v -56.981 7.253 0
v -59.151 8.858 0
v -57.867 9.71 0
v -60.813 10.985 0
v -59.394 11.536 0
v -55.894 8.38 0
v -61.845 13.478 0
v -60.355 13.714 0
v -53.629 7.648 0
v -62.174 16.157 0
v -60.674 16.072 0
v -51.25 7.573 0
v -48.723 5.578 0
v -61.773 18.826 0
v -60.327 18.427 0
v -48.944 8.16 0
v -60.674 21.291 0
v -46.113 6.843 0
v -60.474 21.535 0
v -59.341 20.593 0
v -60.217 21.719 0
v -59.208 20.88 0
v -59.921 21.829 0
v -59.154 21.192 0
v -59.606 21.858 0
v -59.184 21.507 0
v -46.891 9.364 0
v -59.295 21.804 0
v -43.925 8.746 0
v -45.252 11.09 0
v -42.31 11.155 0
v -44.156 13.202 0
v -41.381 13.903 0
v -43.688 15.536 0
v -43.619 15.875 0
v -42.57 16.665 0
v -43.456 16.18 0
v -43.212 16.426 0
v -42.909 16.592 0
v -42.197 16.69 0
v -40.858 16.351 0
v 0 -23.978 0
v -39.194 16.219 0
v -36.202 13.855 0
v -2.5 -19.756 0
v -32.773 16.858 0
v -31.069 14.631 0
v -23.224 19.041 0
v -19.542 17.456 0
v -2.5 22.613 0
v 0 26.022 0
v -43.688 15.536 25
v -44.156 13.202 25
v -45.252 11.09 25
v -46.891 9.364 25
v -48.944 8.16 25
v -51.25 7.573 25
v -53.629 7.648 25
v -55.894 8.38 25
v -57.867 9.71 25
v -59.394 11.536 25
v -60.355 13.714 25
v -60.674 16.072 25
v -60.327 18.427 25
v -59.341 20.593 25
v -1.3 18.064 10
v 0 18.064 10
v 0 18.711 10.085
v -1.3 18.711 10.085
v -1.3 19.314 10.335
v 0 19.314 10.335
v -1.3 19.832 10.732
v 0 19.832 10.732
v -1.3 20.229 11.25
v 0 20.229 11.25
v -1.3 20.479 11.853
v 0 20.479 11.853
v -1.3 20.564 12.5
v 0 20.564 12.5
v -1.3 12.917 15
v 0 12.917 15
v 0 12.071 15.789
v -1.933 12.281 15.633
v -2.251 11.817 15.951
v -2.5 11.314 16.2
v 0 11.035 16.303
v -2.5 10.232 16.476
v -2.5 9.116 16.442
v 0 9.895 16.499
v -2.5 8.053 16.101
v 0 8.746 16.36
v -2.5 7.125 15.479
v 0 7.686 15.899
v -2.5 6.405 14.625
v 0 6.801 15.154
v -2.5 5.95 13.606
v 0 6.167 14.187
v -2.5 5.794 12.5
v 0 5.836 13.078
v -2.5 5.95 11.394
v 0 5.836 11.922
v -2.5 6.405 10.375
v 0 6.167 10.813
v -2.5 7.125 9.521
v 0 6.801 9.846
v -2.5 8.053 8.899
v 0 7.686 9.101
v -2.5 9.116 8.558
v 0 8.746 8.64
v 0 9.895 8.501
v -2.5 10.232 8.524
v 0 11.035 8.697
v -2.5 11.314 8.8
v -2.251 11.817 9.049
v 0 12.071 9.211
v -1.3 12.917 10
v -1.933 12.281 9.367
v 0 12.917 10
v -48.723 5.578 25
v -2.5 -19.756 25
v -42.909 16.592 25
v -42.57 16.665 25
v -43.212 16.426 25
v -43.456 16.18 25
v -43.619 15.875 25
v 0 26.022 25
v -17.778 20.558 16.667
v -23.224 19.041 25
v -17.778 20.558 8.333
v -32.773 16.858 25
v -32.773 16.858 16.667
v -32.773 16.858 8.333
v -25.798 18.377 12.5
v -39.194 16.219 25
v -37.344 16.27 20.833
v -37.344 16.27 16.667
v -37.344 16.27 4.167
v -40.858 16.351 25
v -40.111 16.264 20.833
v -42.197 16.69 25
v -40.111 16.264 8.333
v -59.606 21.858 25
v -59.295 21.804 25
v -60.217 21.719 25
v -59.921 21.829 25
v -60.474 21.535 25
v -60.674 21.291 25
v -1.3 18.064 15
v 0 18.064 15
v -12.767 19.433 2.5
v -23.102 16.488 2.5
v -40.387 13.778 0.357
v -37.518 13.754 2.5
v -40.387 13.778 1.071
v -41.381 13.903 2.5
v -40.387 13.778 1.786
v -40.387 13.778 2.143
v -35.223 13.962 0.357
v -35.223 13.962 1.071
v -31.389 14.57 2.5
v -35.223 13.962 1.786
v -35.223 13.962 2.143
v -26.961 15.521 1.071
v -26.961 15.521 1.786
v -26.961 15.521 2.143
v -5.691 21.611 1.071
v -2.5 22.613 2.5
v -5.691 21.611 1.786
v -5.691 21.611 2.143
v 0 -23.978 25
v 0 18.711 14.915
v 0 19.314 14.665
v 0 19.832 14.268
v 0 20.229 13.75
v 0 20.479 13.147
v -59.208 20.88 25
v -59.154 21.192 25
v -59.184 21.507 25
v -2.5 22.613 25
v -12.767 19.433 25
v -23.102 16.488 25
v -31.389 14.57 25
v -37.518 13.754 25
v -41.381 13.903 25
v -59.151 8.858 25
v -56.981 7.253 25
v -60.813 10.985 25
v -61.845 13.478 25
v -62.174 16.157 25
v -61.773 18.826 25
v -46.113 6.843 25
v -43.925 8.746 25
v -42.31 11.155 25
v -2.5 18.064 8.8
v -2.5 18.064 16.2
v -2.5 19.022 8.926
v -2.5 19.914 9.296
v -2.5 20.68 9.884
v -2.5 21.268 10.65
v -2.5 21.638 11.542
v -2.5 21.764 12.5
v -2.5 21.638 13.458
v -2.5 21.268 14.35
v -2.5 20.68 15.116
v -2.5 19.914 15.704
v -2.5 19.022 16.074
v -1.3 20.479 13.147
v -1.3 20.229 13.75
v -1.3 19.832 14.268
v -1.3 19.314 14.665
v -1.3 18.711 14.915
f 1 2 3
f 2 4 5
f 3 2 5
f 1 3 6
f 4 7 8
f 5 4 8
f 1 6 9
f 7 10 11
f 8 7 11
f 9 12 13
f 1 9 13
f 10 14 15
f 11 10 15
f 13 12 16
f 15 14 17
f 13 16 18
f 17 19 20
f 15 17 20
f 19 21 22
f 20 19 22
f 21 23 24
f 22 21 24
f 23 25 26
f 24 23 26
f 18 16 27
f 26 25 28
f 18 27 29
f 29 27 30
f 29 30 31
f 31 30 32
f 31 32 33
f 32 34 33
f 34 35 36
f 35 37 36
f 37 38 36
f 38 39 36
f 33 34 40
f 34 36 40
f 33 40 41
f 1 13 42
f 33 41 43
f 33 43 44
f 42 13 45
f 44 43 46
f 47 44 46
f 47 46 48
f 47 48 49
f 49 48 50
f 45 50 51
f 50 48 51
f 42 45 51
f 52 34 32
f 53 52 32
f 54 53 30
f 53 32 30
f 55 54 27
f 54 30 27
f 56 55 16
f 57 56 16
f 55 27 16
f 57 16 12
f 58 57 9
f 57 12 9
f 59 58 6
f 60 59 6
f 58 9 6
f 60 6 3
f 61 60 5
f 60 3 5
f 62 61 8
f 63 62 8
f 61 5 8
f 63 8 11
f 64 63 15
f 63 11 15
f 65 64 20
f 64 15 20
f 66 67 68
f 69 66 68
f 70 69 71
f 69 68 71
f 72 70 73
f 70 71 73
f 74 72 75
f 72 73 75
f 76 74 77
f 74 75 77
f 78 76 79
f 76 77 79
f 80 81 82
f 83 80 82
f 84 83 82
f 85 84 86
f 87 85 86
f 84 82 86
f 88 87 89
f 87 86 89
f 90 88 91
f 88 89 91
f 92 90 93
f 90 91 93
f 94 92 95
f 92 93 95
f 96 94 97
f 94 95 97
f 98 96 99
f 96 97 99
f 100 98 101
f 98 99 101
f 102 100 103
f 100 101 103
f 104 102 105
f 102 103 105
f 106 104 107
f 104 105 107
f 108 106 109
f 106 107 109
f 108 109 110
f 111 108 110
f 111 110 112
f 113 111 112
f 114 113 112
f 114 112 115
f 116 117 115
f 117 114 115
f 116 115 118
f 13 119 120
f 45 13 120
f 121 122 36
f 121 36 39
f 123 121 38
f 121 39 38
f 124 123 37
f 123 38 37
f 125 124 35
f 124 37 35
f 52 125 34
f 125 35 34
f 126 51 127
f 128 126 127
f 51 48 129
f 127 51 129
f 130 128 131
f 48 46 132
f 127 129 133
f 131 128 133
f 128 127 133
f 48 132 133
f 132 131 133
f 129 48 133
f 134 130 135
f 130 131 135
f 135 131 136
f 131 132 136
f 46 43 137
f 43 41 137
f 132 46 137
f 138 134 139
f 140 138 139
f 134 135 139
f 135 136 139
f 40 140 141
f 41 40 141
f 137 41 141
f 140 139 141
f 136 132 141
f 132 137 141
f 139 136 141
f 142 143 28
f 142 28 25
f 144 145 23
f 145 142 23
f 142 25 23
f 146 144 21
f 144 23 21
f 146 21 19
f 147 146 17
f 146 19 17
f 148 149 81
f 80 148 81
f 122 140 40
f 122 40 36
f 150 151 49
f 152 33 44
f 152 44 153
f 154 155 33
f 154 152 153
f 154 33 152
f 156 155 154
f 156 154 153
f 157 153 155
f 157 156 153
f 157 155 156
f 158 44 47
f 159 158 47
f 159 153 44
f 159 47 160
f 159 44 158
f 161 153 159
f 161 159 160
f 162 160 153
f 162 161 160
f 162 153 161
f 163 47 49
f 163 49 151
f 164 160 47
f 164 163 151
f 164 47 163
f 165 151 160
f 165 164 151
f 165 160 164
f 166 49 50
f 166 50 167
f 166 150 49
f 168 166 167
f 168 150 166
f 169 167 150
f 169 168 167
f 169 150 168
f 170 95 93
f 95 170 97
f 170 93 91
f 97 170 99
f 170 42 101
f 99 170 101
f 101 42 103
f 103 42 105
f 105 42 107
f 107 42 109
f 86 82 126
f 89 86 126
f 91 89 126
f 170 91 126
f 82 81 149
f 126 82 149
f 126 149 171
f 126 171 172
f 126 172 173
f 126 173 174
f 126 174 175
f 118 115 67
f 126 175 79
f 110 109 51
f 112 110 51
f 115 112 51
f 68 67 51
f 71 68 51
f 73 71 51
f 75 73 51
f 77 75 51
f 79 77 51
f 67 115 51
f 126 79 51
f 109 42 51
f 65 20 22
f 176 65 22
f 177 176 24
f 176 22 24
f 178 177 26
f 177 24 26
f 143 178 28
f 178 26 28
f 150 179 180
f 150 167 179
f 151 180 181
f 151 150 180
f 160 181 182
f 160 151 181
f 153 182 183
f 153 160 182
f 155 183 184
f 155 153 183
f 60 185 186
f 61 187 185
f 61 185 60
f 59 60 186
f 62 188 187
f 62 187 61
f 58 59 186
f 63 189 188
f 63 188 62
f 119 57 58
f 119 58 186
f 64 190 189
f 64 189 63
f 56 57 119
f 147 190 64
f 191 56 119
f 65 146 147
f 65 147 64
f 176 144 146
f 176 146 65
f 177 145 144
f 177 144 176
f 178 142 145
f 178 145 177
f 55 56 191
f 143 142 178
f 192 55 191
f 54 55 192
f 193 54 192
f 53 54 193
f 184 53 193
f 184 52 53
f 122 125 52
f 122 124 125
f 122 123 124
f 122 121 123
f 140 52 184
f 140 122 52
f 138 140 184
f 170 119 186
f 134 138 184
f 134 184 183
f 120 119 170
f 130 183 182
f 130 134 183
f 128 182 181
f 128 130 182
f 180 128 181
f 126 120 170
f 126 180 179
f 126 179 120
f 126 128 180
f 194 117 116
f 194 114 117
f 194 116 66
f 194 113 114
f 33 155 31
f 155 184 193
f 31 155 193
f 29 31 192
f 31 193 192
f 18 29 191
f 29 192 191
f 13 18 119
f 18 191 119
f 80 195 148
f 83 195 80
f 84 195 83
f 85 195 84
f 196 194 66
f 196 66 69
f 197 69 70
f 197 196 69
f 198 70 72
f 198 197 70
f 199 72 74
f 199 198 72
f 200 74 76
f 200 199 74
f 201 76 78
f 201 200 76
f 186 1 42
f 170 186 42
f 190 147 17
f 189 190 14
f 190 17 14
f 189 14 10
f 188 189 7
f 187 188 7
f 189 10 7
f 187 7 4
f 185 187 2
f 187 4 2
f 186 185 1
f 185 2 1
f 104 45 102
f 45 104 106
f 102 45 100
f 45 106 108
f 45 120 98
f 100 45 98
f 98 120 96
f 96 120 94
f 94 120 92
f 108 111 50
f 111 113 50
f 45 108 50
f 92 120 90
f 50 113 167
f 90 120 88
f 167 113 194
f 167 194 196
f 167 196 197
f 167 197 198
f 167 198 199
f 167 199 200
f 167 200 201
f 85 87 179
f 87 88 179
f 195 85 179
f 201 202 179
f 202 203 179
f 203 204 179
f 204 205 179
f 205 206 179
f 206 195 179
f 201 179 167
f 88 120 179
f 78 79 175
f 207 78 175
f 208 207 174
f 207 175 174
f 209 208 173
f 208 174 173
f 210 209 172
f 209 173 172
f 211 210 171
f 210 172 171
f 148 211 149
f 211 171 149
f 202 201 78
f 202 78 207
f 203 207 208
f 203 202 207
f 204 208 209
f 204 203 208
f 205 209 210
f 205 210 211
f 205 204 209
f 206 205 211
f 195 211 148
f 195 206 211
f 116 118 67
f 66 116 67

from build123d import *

# Parameters (mm, degrees)
F1_DEPTH    = 25
F2_T1_DEPTH = 30.6274350033
F2_T3_DEPTH = 31.8341602247
F3_T        = -2.5
F4_DEPTH    = 25
F6_DEPTH    = 3
F7_SIZE     = 1.2


# Not quite as in the source:
# - a fillet or chamfer that OpenCascade refuses, or shapes differently, is made with other operations: its cross-section is extruded or revolved along the edge and cut away or added


with BuildPart() as f1:
    # F0 (on Top) → F1 (new body)
    with BuildSketch(Plane.XY):
        with BuildLine():
            Line((0, -23.9775525033), (0, 0))
            Line((0, 0), (0, 26.0224474967))
            add(Edge.make_bspline(
                [(0, 26.0224474967), (-18.2413181838, 20.2646104982), (-36.4872975651, 14.5034889639), (-42.1967271812, 16.6896569806)],
                knots=[0, 0, 0, 0, 0.7457520739, 0.7457520739, 0.7457520739, 0.7457520739], degree=3))
            ThreePointArc((-42.1967271812, 16.6896569806), (-46.7941768856, 7.5931695596), (-56.9807893445, 7.2532375123))
            Line((-56.9807893445, 7.2532375123), (0, -23.9775525033))
        make_face()
        with BuildLine():
            ThreePointArc((-56.9807893445, 7.2532375123), (-46.7941768856, 7.5931695596), (-42.1967271812, 16.6896569806))
            Line((-42.1967271812, 16.6896569806), (-43.6933846934, 16.589575558))
            ThreePointArc((-43.6933846934, 16.589575558), (-54.7874105132, 7.9340356852), (-58.7207947374, 21.4441899376))
            Line((-58.7207947374, 21.4441899376), (-59.8760331153, 22.4009680155))
            ThreePointArc((-59.8760331153, 22.4009680155), (-61.9966403153, 14.1450934668), (-56.9807893445, 7.2532375123))
        make_face()
    extrude(amount=F1_DEPTH)

    # F2: fillet of radius 1.2 on 3 edges, made by hand

    # F2_s2 → F2_t1 (cut)
    with BuildSketch(Plane.XY.offset(-2.8137175017)):
        with BuildLine():
            ThreePointArc((-59.3412383143, 20.5926836221), (-59.1675384199, 21.4239873058), (-59.5875985888, 22.1620841304))
            Line((-59.5875985888, 22.1620841304), (-58.7207947374, 21.4441899376))
            ThreePointArc((-58.7207947374, 21.4441899376), (-59.0442222025, 21.0280589954), (-59.3412383143, 20.5926836221))
        make_face()
        with BuildLine():
            ThreePointArc((-42.5704056438, 16.6646691181), (-43.3428946364, 16.3118260592), (-43.6883739189, 15.5360158161))
            ThreePointArc((-43.6883739189, 15.5360158161), (-43.6745400624, 16.0628733972), (-43.6933846934, 16.589575558))
            Line((-43.6933846934, 16.589575558), (-42.5704056438, 16.6646691181))
        make_face()
    extrude(amount=F2_T1_DEPTH, mode=Mode.SUBTRACT)

    # F2_s4 → F2_t3 (cut)
    with BuildSketch(Plane.XY.offset(-3.4170801123)):
        with BuildLine():
            ThreePointArc((-58.8885337226, 21.5831127668), (-59.8476100394, 21.8431932263), (-60.6738896743, 21.2911685965))
            ThreePointArc((-60.6738896743, 21.2911685965), (-60.2939449544, 21.8597159591), (-59.8760331153, 22.4009680155))
            Line((-59.8760331153, 22.4009680155), (-58.8885337226, 21.5831127668))
        make_face()
    extrude(amount=F2_T3_DEPTH, mode=Mode.SUBTRACT)

    # F3
    f3_openings = [f1.faces().sort_by_distance(p)[0] for p in [
        (-19.977186, 3.669983, 25),
    ]]
    offset(amount=F3_T, openings=f3_openings)

    # F4 (cut): a face of the model
    f4_faces = [f1.faces().sort_by_distance(p)[0] for p in [
        (-18.9574034875, 3.5679781743, 2.5),
    ]]
    extrude(f4_faces, amount=-F4_DEPTH, mode=Mode.SUBTRACT)

    # F5 (on face) → F6 (cut)
    with BuildSketch(Plane.YZ):
        with BuildLine():
            ThreePointArc((12.9166145043, 10), (13.5683701333, 11.1752351146), (13.7941155051, 12.5))
            ThreePointArc((13.7941155051, 12.5), (13.5683701333, 13.8247648854), (12.9166145043, 15))
            ThreePointArc((12.9166145043, 15), (5.7941155051, 12.5), (12.9166145043, 10))
        make_face()
        with BuildLine():
            ThreePointArc((20.5641841143, 12.5), (19.8319510673, 14.267766953), (18.0641841143, 15))
            ThreePointArc((18.0641841143, 15), (15.5641841143, 12.5), (18.0641841143, 10))
            ThreePointArc((18.0641841143, 10), (19.8319510673, 10.732233047), (20.5641841143, 12.5))
        make_face()
        with BuildLine():
            ThreePointArc((12.9166145043, 15), (13.5683701333, 13.8247648854), (13.7941155051, 12.5))
            ThreePointArc((13.7941155051, 12.5), (13.5683701333, 11.1752351146), (12.9166145043, 10))
            Line((12.9166145043, 10), (18.0641841143, 10))
            ThreePointArc((18.0641841143, 10), (15.5641841143, 12.5), (18.0641841143, 15))
            Line((18.0641841143, 15), (12.9166145043, 15))
        make_face()
    extrude(amount=-F6_DEPTH, mode=Mode.SUBTRACT)

    # F7
    f7_edges = [f1.edges().sort_by_distance(p)[0] for p in [
        (-2.5, 15.490399, 10),
        (-2.5, 15.490399, 15),
        (-2.5, 20.564184, 12.5),
    ]]
    chamfer(f7_edges, length=F7_SIZE)


solid = f1.part
